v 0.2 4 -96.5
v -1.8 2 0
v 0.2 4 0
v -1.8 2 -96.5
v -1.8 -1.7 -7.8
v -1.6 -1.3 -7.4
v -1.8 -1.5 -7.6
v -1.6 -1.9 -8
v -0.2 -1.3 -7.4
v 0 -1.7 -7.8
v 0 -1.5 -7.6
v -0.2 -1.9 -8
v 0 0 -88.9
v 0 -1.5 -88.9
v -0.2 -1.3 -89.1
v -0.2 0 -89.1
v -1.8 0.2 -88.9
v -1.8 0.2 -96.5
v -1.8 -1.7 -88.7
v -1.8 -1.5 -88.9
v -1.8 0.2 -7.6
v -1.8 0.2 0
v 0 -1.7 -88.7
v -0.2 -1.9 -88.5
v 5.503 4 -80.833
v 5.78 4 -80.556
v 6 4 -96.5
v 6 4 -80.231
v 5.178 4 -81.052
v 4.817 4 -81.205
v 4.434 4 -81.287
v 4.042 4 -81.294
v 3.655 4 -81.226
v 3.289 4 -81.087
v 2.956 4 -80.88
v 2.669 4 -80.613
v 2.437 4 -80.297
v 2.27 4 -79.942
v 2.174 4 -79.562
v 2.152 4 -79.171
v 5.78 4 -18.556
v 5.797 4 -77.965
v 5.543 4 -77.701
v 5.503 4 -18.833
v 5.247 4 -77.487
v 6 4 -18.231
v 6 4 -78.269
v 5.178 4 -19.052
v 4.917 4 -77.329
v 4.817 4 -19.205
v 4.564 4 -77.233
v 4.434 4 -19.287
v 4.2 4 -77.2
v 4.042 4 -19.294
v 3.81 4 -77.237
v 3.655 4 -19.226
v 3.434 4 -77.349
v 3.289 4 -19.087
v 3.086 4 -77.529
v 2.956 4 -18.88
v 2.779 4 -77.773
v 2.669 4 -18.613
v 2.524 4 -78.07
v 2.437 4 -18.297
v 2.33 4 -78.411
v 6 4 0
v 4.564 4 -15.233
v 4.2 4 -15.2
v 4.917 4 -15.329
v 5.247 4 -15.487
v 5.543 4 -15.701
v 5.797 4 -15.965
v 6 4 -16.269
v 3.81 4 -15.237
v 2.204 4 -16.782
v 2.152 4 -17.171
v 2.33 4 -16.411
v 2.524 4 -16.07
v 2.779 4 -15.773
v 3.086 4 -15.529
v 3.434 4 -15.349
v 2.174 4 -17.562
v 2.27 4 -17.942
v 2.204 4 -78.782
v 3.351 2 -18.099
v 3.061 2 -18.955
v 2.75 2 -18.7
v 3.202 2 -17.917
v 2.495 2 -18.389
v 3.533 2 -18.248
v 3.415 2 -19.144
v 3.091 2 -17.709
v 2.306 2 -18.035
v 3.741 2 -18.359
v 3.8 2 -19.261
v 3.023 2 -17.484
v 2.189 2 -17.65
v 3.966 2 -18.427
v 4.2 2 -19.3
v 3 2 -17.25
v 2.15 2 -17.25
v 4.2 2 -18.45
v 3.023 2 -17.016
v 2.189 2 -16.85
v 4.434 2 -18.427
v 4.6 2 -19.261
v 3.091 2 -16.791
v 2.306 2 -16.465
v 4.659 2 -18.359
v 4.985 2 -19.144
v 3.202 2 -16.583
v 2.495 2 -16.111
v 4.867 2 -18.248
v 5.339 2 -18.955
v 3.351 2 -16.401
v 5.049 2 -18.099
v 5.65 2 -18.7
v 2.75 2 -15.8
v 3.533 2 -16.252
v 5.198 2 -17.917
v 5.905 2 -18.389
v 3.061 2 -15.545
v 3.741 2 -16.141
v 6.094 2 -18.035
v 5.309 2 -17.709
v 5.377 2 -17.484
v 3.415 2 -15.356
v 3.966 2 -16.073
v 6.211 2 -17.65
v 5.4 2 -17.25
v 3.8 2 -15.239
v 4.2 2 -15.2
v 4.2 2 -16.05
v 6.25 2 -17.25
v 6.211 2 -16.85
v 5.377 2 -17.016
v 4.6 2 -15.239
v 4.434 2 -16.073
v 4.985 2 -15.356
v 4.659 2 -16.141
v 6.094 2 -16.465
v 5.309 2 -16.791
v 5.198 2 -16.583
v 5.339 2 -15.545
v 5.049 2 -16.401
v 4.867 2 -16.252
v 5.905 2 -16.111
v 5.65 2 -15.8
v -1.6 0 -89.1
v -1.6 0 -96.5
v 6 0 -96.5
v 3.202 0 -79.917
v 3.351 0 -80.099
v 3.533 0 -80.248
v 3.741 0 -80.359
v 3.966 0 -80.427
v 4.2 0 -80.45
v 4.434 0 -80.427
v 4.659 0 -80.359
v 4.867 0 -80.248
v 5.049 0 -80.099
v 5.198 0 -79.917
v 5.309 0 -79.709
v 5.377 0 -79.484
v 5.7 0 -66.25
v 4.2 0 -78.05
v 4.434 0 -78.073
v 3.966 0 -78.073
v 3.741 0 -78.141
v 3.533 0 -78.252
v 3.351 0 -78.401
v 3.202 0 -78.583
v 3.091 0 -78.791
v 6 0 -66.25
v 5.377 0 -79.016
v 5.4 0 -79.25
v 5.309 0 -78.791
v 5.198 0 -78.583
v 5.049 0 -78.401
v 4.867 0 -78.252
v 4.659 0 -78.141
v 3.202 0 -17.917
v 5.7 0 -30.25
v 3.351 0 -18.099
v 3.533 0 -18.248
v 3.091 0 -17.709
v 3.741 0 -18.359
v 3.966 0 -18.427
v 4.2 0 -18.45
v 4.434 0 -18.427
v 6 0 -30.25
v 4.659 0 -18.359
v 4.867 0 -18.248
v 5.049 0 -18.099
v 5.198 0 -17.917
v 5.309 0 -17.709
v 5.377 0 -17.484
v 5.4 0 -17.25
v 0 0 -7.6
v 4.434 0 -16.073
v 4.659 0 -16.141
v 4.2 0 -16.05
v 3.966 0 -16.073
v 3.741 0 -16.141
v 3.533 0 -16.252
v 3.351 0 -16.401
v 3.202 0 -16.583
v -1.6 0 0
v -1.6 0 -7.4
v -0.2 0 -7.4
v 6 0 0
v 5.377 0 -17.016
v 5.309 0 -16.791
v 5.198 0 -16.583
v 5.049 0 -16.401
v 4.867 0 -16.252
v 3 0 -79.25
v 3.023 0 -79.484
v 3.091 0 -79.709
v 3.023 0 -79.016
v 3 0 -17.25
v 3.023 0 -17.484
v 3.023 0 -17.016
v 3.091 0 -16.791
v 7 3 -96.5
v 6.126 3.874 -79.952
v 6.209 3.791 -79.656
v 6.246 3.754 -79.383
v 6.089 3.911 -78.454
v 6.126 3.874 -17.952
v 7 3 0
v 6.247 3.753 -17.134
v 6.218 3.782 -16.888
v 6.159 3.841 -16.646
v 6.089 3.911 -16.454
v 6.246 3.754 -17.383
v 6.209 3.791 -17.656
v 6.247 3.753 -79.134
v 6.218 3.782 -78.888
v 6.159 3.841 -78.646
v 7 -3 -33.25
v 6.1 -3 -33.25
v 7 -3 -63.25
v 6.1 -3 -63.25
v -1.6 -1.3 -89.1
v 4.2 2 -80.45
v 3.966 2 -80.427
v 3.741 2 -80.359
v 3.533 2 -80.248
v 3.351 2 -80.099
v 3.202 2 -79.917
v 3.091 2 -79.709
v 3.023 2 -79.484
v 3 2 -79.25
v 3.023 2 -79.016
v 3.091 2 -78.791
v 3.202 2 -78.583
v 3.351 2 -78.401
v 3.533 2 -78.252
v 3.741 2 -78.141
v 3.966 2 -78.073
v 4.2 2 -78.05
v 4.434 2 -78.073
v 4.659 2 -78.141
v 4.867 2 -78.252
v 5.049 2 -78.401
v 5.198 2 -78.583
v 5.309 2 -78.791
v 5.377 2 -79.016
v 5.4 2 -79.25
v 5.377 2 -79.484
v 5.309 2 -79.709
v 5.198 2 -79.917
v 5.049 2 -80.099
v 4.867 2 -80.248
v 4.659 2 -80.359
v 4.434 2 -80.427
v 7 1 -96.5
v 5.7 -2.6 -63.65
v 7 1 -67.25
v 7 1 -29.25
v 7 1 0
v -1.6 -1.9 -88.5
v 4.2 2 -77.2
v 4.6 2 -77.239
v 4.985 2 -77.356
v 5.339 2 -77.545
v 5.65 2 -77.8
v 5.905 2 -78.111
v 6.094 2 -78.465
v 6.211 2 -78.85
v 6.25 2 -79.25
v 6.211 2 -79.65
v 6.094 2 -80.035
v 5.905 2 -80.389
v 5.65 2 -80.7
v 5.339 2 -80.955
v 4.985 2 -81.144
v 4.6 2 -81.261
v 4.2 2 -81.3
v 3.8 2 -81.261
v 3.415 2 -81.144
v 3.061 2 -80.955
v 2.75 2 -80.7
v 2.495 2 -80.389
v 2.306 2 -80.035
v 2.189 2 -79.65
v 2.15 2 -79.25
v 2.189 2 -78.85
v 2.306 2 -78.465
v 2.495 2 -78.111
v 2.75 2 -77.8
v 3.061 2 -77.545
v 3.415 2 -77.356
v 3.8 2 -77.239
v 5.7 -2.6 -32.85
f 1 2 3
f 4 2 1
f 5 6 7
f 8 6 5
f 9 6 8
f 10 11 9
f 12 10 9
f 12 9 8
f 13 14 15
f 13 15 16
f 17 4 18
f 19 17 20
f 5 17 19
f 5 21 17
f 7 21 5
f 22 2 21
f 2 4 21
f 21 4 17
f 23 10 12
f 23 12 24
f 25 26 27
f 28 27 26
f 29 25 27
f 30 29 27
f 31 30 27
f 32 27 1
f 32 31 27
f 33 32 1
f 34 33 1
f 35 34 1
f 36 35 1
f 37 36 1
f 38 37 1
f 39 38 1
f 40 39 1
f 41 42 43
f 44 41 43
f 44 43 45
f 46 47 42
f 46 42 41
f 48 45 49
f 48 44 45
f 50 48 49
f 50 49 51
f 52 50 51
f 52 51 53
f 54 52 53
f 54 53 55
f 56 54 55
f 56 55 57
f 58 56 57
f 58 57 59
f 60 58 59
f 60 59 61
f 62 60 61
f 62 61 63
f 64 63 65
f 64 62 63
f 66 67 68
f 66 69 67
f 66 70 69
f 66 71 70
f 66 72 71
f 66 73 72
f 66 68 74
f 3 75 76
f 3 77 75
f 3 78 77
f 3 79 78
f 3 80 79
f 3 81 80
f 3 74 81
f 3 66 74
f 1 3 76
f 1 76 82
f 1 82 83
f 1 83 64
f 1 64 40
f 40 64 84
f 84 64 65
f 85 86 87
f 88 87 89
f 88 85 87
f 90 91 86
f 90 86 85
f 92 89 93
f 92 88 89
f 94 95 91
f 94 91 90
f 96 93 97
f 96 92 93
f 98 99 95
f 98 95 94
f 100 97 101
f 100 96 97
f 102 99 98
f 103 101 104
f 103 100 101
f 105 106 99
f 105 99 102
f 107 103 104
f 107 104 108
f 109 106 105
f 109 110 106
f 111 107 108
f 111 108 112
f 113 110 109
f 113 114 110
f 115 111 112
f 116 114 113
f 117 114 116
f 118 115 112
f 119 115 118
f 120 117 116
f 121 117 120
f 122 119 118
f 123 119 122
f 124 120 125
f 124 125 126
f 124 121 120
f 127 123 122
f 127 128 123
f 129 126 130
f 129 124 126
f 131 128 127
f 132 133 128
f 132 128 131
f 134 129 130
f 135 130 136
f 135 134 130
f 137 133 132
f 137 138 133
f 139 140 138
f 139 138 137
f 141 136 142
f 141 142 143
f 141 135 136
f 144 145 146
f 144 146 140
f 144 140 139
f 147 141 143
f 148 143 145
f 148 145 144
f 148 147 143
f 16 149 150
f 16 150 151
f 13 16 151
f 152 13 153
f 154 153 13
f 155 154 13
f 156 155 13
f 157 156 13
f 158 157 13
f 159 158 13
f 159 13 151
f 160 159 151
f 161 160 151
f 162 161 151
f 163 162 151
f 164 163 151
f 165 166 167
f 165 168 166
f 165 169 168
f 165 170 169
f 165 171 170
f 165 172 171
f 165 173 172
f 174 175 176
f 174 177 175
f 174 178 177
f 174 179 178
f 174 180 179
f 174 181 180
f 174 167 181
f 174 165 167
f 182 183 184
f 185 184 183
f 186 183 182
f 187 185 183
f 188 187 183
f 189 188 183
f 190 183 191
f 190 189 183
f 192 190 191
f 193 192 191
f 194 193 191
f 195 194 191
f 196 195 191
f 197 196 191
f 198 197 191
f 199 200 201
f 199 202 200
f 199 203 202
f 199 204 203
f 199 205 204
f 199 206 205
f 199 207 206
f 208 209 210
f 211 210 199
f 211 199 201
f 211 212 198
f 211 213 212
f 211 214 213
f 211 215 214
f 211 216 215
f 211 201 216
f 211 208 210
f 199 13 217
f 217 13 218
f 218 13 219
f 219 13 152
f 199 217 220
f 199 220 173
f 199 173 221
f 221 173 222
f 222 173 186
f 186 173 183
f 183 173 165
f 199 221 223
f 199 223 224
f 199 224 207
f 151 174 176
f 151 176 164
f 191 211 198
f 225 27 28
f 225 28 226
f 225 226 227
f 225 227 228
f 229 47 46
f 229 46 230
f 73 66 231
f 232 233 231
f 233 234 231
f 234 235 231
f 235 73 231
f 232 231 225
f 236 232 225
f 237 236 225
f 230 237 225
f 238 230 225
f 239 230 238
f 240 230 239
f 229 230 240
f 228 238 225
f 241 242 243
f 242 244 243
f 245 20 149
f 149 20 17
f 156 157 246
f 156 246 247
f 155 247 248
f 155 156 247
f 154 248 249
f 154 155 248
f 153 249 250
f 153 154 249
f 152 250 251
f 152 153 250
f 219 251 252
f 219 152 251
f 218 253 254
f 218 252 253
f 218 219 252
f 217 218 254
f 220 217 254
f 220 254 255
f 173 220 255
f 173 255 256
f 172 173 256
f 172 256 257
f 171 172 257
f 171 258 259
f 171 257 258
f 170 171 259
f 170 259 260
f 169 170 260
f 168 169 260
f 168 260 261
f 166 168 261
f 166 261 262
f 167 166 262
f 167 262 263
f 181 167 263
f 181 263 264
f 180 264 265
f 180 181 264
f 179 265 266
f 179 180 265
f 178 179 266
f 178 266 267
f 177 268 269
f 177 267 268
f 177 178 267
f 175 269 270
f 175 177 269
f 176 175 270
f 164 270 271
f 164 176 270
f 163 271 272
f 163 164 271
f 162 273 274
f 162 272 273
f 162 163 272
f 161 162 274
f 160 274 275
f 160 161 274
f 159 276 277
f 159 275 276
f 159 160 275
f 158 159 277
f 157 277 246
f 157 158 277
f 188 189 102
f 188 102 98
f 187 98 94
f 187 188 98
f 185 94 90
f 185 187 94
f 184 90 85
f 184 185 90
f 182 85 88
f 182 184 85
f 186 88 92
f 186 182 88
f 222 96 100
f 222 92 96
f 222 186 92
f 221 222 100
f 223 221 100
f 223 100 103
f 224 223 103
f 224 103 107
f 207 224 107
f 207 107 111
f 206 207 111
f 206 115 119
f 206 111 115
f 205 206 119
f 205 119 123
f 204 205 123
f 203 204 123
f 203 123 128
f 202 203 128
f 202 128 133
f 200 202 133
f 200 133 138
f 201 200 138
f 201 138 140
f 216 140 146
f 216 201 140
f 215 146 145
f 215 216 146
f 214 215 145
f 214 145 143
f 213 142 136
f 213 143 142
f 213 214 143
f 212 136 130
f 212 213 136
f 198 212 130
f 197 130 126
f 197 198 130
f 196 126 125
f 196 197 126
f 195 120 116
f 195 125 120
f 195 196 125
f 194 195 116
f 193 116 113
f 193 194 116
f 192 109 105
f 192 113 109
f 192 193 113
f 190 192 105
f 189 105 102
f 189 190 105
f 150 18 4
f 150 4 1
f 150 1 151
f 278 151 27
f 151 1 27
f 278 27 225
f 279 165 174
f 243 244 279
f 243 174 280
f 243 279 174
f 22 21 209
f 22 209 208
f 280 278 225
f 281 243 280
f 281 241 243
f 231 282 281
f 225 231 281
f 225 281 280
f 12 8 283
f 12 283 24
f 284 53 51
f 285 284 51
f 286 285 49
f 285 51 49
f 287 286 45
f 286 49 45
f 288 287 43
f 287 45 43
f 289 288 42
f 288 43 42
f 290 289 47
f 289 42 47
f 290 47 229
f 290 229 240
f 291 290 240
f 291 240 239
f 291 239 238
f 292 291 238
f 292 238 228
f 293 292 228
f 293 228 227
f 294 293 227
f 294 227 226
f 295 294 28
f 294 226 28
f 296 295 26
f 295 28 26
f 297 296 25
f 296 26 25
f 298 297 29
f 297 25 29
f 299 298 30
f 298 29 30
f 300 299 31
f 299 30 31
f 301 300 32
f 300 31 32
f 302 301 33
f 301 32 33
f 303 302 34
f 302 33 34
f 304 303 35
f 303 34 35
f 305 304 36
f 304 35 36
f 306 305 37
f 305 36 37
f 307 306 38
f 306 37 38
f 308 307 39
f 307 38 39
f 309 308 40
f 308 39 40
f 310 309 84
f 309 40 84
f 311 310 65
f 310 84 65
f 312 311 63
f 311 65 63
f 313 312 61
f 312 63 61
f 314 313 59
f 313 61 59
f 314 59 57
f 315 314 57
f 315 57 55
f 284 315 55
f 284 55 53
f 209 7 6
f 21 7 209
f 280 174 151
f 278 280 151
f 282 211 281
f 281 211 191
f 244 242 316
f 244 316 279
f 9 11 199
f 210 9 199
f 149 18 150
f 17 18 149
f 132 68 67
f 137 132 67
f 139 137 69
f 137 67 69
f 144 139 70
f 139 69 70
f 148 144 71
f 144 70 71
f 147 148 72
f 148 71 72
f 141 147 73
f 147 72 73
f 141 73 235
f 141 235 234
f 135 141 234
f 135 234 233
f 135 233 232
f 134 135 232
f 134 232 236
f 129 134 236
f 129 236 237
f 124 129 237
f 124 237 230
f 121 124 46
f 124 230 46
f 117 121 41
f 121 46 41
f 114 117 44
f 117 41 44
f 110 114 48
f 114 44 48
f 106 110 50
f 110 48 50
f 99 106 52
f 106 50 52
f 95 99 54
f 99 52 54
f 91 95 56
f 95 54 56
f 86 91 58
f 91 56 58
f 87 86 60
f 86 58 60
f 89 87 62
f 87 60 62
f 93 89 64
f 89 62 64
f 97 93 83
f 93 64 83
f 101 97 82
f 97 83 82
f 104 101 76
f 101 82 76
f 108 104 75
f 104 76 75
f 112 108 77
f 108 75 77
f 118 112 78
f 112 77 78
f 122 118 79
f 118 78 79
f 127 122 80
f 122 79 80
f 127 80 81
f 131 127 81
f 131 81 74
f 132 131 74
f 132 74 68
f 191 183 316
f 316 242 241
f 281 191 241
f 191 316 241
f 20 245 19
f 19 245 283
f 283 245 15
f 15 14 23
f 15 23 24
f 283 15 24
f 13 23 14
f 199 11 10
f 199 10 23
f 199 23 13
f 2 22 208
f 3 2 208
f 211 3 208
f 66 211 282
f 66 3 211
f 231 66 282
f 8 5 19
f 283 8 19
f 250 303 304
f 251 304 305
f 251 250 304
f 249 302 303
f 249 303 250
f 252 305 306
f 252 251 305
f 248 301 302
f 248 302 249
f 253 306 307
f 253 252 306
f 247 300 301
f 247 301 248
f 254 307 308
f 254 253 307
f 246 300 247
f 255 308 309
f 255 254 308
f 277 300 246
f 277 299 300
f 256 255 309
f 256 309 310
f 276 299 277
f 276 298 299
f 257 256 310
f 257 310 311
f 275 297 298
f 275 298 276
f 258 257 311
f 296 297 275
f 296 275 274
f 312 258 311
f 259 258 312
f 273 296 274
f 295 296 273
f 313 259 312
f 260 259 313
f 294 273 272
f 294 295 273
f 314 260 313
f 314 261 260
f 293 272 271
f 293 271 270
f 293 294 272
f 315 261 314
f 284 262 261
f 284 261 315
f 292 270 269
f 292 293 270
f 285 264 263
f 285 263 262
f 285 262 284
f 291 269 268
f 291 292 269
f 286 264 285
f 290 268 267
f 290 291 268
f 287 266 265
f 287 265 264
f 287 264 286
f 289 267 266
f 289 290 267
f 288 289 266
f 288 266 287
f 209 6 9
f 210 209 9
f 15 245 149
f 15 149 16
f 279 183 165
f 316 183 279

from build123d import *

# Parameters (mm, degrees)
EXTRUDE_1_DEPTH          = 96.5
CUT_EXTRUDE_1_DEPTH      = 97.93327602
CUT_EXTRUDE_1_DEPTH_BACK = 10
SKETCH_2_R               = 1.2
SKETCH_2_3_R             = 2.05
CUT_EXTRUDE_2_DEPTH      = 2
CHAMFER_3_SIZE           = 2
SKETCH_3_W               = 1.8
SKETCH_3_H               = 7.4
CUT_EXTRUDE_3_DEPTH      = 1.9
CHAMFER_4_SIZE           = 0.2
CHAMFER_5_SIZE           = 0.6
CHAMFER_2_SIZE           = 1
SKETCH_4_W               = 1.3
SKETCH_4_H               = 30
EXTRUDE_2_DEPTH          = 3
CHAMFER_6_SIZE           = 3
CHAMFER_1_SIZE           = 1
CHAMFER_7_SIZE           = 0.4


# Some blends are built 0.0001 mm under size
with BuildPart() as part:
    # 草图1 → 凸台-拉伸1 (new body)
    with BuildSketch(Plane.XY):
        Polygon((0, 0), (7, 0), (7, 4), (0, 4), (-1.8, 4), (-1.8, -1.9), (0, -1.9), align=None)
    extrude(amount=-EXTRUDE_1_DEPTH)

    # 草图2 → 切除-拉伸1 (cut, two sides: drawn at the far end of the back side and taken through both)
    with BuildSketch(Plane(origin=(0, 4, 0), x_dir=(1, 0, 0), z_dir=(0, 1, 0)).offset(-CUT_EXTRUDE_1_DEPTH_BACK)):
        with Locations(Location((4.2, 79.25, 0), (0, 0, 90))):
            Circle(SKETCH_2_R)
        with Locations(Location((4.2, 17.25, 0), (0, 0, 90))):
            Circle(SKETCH_2_R)
    extrude(amount=CUT_EXTRUDE_1_DEPTH + CUT_EXTRUDE_1_DEPTH_BACK, mode=Mode.SUBTRACT)

    # 草图2<3> → 切除-拉伸2 (cut)
    with BuildSketch(Plane(origin=(0, 4, 0), x_dir=(1, 0, 0), z_dir=(0, 1, 0))):
        with Locations(Location((4.2, 79.25, 0), (0, 0, 270))):
            Circle(SKETCH_2_3_R)
        with Locations(Location((4.2, 17.25, 0), (0, 0, 270))):
            Circle(SKETCH_2_3_R)
    extrude(amount=-CUT_EXTRUDE_2_DEPTH, mode=Mode.SUBTRACT)

    # 倒角3
    chamfer_3_edges = [part.edges().sort_by_distance(p)[0] for p in [
        (-1.8, 4, -48.25),
    ]]
    chamfer(chamfer_3_edges, length=CHAMFER_3_SIZE)

    # 草图3 → 切除-拉伸3 (cut)
    with BuildSketch(Plane.XZ.offset(1.9)):
        with Locations((-0.9, -92.8)):
            Rectangle(SKETCH_3_W, SKETCH_3_H)
        with Locations((-0.9, -3.7)):
            Rectangle(SKETCH_3_W, SKETCH_3_H)
    extrude(amount=-CUT_EXTRUDE_3_DEPTH, mode=Mode.SUBTRACT)

    # 倒角4
    chamfer_4_edges = [part.edges().sort_by_distance(p)[0] for p in [
        (-1.8, -1.9, -48.25),
        (0, -1.9, -48.25),
        (-1.8, -0.95, -89.1),
        (0, -0.95, -89.1),
        (-1.8, 0, -92.8),
        (-1.8, -0.95, -7.4),
        (0, -0.95, -7.4),
        (-1.8, 0, -3.7),
    ]]
    chamfer(chamfer_4_edges, length=CHAMFER_4_SIZE)

    # 倒角5
    # the kernel refuses this chamfer: 0.6 mm, written as the material it takes off along each edge
    with BuildSketch(Plane(origin=(1.343009793, -1.9, -89.1), x_dir=(0, 0.9996219169112965, -0.027495876610595982), z_dir=(-1, 0, 0))) as chamfer_5_piece_1:
        Polygon((CHAMFER_5_SIZE * 0.999621916911, -CHAMFER_5_SIZE * 0.0274958766106), (-CHAMFER_5_SIZE * 0.0274958766106, -CHAMFER_5_SIZE * 0.999621916911), (0, 0), align=None)
    extrude(amount=4.486019586, mode=Mode.SUBTRACT)
    with BuildSketch(Plane(origin=(1.343009793, -1.9, -7.4), x_dir=(0, 0.9996219169112968, 0.027495876610585925), z_dir=(-1, 0, 0))) as chamfer_5_piece_2:
        Polygon((CHAMFER_5_SIZE * 0.999621916911, CHAMFER_5_SIZE * 0.0274958766106), (-CHAMFER_5_SIZE * 0.0274958766106, CHAMFER_5_SIZE * 0.999621916911), (0, 0), align=None)
    extrude(amount=4.486019586, mode=Mode.SUBTRACT)

    # 倒角2
    # the kernel refuses this chamfer: 1 mm, written as the material it takes off along each edge
    with BuildSketch(Plane(origin=(7, 4, 2.571682988), x_dir=(-0.9996219169112968, 0.027495876610586487, 0), z_dir=(0, 0, -1))) as chamfer_2_piece_1:
        Polygon((CHAMFER_2_SIZE * 0.999621916911, -CHAMFER_2_SIZE * 0.0274958766106), (-CHAMFER_2_SIZE * 0.0274958766106, -CHAMFER_2_SIZE * 0.999621916911), (0, 0), align=None)
    extrude(amount=101.643365976, mode=Mode.SUBTRACT)

    # 草图4 → 凸台-拉伸2 (add)
    with BuildSketch(Plane(origin=(0, 0, 0), x_dir=(1, 0, 0), z_dir=(0, 1, 0))):
        with Locations((6.35, 48.25)):
            Rectangle(SKETCH_4_W, SKETCH_4_H)
    extrude(amount=-EXTRUDE_2_DEPTH)

    # 倒角6
    chamfer_6_edges = [part.edges().sort_by_distance(p)[0] for p in [
        (6.35, 0, -33.25),
        (6.35, 0, -63.25),
    ]]
    chamfer(chamfer_6_edges, length=CHAMFER_6_SIZE - 0.0001)  # a hair under: the kernel refuses the full size

    # 倒角1
    chamfer_1_edges = [part.edges().sort_by_distance(p)[0] for p in [
        (7, 0, -81.37495),
        (7, 0, -15.12505),
    ]]
    chamfer(chamfer_1_edges, length=CHAMFER_1_SIZE)

    # 倒角7
    chamfer_7_edges = [part.edges().sort_by_distance(p)[0] for p in [
        (5.7, -3, -48.25),
    ]]
    chamfer(chamfer_7_edges, length=CHAMFER_7_SIZE)


solid = part.part
